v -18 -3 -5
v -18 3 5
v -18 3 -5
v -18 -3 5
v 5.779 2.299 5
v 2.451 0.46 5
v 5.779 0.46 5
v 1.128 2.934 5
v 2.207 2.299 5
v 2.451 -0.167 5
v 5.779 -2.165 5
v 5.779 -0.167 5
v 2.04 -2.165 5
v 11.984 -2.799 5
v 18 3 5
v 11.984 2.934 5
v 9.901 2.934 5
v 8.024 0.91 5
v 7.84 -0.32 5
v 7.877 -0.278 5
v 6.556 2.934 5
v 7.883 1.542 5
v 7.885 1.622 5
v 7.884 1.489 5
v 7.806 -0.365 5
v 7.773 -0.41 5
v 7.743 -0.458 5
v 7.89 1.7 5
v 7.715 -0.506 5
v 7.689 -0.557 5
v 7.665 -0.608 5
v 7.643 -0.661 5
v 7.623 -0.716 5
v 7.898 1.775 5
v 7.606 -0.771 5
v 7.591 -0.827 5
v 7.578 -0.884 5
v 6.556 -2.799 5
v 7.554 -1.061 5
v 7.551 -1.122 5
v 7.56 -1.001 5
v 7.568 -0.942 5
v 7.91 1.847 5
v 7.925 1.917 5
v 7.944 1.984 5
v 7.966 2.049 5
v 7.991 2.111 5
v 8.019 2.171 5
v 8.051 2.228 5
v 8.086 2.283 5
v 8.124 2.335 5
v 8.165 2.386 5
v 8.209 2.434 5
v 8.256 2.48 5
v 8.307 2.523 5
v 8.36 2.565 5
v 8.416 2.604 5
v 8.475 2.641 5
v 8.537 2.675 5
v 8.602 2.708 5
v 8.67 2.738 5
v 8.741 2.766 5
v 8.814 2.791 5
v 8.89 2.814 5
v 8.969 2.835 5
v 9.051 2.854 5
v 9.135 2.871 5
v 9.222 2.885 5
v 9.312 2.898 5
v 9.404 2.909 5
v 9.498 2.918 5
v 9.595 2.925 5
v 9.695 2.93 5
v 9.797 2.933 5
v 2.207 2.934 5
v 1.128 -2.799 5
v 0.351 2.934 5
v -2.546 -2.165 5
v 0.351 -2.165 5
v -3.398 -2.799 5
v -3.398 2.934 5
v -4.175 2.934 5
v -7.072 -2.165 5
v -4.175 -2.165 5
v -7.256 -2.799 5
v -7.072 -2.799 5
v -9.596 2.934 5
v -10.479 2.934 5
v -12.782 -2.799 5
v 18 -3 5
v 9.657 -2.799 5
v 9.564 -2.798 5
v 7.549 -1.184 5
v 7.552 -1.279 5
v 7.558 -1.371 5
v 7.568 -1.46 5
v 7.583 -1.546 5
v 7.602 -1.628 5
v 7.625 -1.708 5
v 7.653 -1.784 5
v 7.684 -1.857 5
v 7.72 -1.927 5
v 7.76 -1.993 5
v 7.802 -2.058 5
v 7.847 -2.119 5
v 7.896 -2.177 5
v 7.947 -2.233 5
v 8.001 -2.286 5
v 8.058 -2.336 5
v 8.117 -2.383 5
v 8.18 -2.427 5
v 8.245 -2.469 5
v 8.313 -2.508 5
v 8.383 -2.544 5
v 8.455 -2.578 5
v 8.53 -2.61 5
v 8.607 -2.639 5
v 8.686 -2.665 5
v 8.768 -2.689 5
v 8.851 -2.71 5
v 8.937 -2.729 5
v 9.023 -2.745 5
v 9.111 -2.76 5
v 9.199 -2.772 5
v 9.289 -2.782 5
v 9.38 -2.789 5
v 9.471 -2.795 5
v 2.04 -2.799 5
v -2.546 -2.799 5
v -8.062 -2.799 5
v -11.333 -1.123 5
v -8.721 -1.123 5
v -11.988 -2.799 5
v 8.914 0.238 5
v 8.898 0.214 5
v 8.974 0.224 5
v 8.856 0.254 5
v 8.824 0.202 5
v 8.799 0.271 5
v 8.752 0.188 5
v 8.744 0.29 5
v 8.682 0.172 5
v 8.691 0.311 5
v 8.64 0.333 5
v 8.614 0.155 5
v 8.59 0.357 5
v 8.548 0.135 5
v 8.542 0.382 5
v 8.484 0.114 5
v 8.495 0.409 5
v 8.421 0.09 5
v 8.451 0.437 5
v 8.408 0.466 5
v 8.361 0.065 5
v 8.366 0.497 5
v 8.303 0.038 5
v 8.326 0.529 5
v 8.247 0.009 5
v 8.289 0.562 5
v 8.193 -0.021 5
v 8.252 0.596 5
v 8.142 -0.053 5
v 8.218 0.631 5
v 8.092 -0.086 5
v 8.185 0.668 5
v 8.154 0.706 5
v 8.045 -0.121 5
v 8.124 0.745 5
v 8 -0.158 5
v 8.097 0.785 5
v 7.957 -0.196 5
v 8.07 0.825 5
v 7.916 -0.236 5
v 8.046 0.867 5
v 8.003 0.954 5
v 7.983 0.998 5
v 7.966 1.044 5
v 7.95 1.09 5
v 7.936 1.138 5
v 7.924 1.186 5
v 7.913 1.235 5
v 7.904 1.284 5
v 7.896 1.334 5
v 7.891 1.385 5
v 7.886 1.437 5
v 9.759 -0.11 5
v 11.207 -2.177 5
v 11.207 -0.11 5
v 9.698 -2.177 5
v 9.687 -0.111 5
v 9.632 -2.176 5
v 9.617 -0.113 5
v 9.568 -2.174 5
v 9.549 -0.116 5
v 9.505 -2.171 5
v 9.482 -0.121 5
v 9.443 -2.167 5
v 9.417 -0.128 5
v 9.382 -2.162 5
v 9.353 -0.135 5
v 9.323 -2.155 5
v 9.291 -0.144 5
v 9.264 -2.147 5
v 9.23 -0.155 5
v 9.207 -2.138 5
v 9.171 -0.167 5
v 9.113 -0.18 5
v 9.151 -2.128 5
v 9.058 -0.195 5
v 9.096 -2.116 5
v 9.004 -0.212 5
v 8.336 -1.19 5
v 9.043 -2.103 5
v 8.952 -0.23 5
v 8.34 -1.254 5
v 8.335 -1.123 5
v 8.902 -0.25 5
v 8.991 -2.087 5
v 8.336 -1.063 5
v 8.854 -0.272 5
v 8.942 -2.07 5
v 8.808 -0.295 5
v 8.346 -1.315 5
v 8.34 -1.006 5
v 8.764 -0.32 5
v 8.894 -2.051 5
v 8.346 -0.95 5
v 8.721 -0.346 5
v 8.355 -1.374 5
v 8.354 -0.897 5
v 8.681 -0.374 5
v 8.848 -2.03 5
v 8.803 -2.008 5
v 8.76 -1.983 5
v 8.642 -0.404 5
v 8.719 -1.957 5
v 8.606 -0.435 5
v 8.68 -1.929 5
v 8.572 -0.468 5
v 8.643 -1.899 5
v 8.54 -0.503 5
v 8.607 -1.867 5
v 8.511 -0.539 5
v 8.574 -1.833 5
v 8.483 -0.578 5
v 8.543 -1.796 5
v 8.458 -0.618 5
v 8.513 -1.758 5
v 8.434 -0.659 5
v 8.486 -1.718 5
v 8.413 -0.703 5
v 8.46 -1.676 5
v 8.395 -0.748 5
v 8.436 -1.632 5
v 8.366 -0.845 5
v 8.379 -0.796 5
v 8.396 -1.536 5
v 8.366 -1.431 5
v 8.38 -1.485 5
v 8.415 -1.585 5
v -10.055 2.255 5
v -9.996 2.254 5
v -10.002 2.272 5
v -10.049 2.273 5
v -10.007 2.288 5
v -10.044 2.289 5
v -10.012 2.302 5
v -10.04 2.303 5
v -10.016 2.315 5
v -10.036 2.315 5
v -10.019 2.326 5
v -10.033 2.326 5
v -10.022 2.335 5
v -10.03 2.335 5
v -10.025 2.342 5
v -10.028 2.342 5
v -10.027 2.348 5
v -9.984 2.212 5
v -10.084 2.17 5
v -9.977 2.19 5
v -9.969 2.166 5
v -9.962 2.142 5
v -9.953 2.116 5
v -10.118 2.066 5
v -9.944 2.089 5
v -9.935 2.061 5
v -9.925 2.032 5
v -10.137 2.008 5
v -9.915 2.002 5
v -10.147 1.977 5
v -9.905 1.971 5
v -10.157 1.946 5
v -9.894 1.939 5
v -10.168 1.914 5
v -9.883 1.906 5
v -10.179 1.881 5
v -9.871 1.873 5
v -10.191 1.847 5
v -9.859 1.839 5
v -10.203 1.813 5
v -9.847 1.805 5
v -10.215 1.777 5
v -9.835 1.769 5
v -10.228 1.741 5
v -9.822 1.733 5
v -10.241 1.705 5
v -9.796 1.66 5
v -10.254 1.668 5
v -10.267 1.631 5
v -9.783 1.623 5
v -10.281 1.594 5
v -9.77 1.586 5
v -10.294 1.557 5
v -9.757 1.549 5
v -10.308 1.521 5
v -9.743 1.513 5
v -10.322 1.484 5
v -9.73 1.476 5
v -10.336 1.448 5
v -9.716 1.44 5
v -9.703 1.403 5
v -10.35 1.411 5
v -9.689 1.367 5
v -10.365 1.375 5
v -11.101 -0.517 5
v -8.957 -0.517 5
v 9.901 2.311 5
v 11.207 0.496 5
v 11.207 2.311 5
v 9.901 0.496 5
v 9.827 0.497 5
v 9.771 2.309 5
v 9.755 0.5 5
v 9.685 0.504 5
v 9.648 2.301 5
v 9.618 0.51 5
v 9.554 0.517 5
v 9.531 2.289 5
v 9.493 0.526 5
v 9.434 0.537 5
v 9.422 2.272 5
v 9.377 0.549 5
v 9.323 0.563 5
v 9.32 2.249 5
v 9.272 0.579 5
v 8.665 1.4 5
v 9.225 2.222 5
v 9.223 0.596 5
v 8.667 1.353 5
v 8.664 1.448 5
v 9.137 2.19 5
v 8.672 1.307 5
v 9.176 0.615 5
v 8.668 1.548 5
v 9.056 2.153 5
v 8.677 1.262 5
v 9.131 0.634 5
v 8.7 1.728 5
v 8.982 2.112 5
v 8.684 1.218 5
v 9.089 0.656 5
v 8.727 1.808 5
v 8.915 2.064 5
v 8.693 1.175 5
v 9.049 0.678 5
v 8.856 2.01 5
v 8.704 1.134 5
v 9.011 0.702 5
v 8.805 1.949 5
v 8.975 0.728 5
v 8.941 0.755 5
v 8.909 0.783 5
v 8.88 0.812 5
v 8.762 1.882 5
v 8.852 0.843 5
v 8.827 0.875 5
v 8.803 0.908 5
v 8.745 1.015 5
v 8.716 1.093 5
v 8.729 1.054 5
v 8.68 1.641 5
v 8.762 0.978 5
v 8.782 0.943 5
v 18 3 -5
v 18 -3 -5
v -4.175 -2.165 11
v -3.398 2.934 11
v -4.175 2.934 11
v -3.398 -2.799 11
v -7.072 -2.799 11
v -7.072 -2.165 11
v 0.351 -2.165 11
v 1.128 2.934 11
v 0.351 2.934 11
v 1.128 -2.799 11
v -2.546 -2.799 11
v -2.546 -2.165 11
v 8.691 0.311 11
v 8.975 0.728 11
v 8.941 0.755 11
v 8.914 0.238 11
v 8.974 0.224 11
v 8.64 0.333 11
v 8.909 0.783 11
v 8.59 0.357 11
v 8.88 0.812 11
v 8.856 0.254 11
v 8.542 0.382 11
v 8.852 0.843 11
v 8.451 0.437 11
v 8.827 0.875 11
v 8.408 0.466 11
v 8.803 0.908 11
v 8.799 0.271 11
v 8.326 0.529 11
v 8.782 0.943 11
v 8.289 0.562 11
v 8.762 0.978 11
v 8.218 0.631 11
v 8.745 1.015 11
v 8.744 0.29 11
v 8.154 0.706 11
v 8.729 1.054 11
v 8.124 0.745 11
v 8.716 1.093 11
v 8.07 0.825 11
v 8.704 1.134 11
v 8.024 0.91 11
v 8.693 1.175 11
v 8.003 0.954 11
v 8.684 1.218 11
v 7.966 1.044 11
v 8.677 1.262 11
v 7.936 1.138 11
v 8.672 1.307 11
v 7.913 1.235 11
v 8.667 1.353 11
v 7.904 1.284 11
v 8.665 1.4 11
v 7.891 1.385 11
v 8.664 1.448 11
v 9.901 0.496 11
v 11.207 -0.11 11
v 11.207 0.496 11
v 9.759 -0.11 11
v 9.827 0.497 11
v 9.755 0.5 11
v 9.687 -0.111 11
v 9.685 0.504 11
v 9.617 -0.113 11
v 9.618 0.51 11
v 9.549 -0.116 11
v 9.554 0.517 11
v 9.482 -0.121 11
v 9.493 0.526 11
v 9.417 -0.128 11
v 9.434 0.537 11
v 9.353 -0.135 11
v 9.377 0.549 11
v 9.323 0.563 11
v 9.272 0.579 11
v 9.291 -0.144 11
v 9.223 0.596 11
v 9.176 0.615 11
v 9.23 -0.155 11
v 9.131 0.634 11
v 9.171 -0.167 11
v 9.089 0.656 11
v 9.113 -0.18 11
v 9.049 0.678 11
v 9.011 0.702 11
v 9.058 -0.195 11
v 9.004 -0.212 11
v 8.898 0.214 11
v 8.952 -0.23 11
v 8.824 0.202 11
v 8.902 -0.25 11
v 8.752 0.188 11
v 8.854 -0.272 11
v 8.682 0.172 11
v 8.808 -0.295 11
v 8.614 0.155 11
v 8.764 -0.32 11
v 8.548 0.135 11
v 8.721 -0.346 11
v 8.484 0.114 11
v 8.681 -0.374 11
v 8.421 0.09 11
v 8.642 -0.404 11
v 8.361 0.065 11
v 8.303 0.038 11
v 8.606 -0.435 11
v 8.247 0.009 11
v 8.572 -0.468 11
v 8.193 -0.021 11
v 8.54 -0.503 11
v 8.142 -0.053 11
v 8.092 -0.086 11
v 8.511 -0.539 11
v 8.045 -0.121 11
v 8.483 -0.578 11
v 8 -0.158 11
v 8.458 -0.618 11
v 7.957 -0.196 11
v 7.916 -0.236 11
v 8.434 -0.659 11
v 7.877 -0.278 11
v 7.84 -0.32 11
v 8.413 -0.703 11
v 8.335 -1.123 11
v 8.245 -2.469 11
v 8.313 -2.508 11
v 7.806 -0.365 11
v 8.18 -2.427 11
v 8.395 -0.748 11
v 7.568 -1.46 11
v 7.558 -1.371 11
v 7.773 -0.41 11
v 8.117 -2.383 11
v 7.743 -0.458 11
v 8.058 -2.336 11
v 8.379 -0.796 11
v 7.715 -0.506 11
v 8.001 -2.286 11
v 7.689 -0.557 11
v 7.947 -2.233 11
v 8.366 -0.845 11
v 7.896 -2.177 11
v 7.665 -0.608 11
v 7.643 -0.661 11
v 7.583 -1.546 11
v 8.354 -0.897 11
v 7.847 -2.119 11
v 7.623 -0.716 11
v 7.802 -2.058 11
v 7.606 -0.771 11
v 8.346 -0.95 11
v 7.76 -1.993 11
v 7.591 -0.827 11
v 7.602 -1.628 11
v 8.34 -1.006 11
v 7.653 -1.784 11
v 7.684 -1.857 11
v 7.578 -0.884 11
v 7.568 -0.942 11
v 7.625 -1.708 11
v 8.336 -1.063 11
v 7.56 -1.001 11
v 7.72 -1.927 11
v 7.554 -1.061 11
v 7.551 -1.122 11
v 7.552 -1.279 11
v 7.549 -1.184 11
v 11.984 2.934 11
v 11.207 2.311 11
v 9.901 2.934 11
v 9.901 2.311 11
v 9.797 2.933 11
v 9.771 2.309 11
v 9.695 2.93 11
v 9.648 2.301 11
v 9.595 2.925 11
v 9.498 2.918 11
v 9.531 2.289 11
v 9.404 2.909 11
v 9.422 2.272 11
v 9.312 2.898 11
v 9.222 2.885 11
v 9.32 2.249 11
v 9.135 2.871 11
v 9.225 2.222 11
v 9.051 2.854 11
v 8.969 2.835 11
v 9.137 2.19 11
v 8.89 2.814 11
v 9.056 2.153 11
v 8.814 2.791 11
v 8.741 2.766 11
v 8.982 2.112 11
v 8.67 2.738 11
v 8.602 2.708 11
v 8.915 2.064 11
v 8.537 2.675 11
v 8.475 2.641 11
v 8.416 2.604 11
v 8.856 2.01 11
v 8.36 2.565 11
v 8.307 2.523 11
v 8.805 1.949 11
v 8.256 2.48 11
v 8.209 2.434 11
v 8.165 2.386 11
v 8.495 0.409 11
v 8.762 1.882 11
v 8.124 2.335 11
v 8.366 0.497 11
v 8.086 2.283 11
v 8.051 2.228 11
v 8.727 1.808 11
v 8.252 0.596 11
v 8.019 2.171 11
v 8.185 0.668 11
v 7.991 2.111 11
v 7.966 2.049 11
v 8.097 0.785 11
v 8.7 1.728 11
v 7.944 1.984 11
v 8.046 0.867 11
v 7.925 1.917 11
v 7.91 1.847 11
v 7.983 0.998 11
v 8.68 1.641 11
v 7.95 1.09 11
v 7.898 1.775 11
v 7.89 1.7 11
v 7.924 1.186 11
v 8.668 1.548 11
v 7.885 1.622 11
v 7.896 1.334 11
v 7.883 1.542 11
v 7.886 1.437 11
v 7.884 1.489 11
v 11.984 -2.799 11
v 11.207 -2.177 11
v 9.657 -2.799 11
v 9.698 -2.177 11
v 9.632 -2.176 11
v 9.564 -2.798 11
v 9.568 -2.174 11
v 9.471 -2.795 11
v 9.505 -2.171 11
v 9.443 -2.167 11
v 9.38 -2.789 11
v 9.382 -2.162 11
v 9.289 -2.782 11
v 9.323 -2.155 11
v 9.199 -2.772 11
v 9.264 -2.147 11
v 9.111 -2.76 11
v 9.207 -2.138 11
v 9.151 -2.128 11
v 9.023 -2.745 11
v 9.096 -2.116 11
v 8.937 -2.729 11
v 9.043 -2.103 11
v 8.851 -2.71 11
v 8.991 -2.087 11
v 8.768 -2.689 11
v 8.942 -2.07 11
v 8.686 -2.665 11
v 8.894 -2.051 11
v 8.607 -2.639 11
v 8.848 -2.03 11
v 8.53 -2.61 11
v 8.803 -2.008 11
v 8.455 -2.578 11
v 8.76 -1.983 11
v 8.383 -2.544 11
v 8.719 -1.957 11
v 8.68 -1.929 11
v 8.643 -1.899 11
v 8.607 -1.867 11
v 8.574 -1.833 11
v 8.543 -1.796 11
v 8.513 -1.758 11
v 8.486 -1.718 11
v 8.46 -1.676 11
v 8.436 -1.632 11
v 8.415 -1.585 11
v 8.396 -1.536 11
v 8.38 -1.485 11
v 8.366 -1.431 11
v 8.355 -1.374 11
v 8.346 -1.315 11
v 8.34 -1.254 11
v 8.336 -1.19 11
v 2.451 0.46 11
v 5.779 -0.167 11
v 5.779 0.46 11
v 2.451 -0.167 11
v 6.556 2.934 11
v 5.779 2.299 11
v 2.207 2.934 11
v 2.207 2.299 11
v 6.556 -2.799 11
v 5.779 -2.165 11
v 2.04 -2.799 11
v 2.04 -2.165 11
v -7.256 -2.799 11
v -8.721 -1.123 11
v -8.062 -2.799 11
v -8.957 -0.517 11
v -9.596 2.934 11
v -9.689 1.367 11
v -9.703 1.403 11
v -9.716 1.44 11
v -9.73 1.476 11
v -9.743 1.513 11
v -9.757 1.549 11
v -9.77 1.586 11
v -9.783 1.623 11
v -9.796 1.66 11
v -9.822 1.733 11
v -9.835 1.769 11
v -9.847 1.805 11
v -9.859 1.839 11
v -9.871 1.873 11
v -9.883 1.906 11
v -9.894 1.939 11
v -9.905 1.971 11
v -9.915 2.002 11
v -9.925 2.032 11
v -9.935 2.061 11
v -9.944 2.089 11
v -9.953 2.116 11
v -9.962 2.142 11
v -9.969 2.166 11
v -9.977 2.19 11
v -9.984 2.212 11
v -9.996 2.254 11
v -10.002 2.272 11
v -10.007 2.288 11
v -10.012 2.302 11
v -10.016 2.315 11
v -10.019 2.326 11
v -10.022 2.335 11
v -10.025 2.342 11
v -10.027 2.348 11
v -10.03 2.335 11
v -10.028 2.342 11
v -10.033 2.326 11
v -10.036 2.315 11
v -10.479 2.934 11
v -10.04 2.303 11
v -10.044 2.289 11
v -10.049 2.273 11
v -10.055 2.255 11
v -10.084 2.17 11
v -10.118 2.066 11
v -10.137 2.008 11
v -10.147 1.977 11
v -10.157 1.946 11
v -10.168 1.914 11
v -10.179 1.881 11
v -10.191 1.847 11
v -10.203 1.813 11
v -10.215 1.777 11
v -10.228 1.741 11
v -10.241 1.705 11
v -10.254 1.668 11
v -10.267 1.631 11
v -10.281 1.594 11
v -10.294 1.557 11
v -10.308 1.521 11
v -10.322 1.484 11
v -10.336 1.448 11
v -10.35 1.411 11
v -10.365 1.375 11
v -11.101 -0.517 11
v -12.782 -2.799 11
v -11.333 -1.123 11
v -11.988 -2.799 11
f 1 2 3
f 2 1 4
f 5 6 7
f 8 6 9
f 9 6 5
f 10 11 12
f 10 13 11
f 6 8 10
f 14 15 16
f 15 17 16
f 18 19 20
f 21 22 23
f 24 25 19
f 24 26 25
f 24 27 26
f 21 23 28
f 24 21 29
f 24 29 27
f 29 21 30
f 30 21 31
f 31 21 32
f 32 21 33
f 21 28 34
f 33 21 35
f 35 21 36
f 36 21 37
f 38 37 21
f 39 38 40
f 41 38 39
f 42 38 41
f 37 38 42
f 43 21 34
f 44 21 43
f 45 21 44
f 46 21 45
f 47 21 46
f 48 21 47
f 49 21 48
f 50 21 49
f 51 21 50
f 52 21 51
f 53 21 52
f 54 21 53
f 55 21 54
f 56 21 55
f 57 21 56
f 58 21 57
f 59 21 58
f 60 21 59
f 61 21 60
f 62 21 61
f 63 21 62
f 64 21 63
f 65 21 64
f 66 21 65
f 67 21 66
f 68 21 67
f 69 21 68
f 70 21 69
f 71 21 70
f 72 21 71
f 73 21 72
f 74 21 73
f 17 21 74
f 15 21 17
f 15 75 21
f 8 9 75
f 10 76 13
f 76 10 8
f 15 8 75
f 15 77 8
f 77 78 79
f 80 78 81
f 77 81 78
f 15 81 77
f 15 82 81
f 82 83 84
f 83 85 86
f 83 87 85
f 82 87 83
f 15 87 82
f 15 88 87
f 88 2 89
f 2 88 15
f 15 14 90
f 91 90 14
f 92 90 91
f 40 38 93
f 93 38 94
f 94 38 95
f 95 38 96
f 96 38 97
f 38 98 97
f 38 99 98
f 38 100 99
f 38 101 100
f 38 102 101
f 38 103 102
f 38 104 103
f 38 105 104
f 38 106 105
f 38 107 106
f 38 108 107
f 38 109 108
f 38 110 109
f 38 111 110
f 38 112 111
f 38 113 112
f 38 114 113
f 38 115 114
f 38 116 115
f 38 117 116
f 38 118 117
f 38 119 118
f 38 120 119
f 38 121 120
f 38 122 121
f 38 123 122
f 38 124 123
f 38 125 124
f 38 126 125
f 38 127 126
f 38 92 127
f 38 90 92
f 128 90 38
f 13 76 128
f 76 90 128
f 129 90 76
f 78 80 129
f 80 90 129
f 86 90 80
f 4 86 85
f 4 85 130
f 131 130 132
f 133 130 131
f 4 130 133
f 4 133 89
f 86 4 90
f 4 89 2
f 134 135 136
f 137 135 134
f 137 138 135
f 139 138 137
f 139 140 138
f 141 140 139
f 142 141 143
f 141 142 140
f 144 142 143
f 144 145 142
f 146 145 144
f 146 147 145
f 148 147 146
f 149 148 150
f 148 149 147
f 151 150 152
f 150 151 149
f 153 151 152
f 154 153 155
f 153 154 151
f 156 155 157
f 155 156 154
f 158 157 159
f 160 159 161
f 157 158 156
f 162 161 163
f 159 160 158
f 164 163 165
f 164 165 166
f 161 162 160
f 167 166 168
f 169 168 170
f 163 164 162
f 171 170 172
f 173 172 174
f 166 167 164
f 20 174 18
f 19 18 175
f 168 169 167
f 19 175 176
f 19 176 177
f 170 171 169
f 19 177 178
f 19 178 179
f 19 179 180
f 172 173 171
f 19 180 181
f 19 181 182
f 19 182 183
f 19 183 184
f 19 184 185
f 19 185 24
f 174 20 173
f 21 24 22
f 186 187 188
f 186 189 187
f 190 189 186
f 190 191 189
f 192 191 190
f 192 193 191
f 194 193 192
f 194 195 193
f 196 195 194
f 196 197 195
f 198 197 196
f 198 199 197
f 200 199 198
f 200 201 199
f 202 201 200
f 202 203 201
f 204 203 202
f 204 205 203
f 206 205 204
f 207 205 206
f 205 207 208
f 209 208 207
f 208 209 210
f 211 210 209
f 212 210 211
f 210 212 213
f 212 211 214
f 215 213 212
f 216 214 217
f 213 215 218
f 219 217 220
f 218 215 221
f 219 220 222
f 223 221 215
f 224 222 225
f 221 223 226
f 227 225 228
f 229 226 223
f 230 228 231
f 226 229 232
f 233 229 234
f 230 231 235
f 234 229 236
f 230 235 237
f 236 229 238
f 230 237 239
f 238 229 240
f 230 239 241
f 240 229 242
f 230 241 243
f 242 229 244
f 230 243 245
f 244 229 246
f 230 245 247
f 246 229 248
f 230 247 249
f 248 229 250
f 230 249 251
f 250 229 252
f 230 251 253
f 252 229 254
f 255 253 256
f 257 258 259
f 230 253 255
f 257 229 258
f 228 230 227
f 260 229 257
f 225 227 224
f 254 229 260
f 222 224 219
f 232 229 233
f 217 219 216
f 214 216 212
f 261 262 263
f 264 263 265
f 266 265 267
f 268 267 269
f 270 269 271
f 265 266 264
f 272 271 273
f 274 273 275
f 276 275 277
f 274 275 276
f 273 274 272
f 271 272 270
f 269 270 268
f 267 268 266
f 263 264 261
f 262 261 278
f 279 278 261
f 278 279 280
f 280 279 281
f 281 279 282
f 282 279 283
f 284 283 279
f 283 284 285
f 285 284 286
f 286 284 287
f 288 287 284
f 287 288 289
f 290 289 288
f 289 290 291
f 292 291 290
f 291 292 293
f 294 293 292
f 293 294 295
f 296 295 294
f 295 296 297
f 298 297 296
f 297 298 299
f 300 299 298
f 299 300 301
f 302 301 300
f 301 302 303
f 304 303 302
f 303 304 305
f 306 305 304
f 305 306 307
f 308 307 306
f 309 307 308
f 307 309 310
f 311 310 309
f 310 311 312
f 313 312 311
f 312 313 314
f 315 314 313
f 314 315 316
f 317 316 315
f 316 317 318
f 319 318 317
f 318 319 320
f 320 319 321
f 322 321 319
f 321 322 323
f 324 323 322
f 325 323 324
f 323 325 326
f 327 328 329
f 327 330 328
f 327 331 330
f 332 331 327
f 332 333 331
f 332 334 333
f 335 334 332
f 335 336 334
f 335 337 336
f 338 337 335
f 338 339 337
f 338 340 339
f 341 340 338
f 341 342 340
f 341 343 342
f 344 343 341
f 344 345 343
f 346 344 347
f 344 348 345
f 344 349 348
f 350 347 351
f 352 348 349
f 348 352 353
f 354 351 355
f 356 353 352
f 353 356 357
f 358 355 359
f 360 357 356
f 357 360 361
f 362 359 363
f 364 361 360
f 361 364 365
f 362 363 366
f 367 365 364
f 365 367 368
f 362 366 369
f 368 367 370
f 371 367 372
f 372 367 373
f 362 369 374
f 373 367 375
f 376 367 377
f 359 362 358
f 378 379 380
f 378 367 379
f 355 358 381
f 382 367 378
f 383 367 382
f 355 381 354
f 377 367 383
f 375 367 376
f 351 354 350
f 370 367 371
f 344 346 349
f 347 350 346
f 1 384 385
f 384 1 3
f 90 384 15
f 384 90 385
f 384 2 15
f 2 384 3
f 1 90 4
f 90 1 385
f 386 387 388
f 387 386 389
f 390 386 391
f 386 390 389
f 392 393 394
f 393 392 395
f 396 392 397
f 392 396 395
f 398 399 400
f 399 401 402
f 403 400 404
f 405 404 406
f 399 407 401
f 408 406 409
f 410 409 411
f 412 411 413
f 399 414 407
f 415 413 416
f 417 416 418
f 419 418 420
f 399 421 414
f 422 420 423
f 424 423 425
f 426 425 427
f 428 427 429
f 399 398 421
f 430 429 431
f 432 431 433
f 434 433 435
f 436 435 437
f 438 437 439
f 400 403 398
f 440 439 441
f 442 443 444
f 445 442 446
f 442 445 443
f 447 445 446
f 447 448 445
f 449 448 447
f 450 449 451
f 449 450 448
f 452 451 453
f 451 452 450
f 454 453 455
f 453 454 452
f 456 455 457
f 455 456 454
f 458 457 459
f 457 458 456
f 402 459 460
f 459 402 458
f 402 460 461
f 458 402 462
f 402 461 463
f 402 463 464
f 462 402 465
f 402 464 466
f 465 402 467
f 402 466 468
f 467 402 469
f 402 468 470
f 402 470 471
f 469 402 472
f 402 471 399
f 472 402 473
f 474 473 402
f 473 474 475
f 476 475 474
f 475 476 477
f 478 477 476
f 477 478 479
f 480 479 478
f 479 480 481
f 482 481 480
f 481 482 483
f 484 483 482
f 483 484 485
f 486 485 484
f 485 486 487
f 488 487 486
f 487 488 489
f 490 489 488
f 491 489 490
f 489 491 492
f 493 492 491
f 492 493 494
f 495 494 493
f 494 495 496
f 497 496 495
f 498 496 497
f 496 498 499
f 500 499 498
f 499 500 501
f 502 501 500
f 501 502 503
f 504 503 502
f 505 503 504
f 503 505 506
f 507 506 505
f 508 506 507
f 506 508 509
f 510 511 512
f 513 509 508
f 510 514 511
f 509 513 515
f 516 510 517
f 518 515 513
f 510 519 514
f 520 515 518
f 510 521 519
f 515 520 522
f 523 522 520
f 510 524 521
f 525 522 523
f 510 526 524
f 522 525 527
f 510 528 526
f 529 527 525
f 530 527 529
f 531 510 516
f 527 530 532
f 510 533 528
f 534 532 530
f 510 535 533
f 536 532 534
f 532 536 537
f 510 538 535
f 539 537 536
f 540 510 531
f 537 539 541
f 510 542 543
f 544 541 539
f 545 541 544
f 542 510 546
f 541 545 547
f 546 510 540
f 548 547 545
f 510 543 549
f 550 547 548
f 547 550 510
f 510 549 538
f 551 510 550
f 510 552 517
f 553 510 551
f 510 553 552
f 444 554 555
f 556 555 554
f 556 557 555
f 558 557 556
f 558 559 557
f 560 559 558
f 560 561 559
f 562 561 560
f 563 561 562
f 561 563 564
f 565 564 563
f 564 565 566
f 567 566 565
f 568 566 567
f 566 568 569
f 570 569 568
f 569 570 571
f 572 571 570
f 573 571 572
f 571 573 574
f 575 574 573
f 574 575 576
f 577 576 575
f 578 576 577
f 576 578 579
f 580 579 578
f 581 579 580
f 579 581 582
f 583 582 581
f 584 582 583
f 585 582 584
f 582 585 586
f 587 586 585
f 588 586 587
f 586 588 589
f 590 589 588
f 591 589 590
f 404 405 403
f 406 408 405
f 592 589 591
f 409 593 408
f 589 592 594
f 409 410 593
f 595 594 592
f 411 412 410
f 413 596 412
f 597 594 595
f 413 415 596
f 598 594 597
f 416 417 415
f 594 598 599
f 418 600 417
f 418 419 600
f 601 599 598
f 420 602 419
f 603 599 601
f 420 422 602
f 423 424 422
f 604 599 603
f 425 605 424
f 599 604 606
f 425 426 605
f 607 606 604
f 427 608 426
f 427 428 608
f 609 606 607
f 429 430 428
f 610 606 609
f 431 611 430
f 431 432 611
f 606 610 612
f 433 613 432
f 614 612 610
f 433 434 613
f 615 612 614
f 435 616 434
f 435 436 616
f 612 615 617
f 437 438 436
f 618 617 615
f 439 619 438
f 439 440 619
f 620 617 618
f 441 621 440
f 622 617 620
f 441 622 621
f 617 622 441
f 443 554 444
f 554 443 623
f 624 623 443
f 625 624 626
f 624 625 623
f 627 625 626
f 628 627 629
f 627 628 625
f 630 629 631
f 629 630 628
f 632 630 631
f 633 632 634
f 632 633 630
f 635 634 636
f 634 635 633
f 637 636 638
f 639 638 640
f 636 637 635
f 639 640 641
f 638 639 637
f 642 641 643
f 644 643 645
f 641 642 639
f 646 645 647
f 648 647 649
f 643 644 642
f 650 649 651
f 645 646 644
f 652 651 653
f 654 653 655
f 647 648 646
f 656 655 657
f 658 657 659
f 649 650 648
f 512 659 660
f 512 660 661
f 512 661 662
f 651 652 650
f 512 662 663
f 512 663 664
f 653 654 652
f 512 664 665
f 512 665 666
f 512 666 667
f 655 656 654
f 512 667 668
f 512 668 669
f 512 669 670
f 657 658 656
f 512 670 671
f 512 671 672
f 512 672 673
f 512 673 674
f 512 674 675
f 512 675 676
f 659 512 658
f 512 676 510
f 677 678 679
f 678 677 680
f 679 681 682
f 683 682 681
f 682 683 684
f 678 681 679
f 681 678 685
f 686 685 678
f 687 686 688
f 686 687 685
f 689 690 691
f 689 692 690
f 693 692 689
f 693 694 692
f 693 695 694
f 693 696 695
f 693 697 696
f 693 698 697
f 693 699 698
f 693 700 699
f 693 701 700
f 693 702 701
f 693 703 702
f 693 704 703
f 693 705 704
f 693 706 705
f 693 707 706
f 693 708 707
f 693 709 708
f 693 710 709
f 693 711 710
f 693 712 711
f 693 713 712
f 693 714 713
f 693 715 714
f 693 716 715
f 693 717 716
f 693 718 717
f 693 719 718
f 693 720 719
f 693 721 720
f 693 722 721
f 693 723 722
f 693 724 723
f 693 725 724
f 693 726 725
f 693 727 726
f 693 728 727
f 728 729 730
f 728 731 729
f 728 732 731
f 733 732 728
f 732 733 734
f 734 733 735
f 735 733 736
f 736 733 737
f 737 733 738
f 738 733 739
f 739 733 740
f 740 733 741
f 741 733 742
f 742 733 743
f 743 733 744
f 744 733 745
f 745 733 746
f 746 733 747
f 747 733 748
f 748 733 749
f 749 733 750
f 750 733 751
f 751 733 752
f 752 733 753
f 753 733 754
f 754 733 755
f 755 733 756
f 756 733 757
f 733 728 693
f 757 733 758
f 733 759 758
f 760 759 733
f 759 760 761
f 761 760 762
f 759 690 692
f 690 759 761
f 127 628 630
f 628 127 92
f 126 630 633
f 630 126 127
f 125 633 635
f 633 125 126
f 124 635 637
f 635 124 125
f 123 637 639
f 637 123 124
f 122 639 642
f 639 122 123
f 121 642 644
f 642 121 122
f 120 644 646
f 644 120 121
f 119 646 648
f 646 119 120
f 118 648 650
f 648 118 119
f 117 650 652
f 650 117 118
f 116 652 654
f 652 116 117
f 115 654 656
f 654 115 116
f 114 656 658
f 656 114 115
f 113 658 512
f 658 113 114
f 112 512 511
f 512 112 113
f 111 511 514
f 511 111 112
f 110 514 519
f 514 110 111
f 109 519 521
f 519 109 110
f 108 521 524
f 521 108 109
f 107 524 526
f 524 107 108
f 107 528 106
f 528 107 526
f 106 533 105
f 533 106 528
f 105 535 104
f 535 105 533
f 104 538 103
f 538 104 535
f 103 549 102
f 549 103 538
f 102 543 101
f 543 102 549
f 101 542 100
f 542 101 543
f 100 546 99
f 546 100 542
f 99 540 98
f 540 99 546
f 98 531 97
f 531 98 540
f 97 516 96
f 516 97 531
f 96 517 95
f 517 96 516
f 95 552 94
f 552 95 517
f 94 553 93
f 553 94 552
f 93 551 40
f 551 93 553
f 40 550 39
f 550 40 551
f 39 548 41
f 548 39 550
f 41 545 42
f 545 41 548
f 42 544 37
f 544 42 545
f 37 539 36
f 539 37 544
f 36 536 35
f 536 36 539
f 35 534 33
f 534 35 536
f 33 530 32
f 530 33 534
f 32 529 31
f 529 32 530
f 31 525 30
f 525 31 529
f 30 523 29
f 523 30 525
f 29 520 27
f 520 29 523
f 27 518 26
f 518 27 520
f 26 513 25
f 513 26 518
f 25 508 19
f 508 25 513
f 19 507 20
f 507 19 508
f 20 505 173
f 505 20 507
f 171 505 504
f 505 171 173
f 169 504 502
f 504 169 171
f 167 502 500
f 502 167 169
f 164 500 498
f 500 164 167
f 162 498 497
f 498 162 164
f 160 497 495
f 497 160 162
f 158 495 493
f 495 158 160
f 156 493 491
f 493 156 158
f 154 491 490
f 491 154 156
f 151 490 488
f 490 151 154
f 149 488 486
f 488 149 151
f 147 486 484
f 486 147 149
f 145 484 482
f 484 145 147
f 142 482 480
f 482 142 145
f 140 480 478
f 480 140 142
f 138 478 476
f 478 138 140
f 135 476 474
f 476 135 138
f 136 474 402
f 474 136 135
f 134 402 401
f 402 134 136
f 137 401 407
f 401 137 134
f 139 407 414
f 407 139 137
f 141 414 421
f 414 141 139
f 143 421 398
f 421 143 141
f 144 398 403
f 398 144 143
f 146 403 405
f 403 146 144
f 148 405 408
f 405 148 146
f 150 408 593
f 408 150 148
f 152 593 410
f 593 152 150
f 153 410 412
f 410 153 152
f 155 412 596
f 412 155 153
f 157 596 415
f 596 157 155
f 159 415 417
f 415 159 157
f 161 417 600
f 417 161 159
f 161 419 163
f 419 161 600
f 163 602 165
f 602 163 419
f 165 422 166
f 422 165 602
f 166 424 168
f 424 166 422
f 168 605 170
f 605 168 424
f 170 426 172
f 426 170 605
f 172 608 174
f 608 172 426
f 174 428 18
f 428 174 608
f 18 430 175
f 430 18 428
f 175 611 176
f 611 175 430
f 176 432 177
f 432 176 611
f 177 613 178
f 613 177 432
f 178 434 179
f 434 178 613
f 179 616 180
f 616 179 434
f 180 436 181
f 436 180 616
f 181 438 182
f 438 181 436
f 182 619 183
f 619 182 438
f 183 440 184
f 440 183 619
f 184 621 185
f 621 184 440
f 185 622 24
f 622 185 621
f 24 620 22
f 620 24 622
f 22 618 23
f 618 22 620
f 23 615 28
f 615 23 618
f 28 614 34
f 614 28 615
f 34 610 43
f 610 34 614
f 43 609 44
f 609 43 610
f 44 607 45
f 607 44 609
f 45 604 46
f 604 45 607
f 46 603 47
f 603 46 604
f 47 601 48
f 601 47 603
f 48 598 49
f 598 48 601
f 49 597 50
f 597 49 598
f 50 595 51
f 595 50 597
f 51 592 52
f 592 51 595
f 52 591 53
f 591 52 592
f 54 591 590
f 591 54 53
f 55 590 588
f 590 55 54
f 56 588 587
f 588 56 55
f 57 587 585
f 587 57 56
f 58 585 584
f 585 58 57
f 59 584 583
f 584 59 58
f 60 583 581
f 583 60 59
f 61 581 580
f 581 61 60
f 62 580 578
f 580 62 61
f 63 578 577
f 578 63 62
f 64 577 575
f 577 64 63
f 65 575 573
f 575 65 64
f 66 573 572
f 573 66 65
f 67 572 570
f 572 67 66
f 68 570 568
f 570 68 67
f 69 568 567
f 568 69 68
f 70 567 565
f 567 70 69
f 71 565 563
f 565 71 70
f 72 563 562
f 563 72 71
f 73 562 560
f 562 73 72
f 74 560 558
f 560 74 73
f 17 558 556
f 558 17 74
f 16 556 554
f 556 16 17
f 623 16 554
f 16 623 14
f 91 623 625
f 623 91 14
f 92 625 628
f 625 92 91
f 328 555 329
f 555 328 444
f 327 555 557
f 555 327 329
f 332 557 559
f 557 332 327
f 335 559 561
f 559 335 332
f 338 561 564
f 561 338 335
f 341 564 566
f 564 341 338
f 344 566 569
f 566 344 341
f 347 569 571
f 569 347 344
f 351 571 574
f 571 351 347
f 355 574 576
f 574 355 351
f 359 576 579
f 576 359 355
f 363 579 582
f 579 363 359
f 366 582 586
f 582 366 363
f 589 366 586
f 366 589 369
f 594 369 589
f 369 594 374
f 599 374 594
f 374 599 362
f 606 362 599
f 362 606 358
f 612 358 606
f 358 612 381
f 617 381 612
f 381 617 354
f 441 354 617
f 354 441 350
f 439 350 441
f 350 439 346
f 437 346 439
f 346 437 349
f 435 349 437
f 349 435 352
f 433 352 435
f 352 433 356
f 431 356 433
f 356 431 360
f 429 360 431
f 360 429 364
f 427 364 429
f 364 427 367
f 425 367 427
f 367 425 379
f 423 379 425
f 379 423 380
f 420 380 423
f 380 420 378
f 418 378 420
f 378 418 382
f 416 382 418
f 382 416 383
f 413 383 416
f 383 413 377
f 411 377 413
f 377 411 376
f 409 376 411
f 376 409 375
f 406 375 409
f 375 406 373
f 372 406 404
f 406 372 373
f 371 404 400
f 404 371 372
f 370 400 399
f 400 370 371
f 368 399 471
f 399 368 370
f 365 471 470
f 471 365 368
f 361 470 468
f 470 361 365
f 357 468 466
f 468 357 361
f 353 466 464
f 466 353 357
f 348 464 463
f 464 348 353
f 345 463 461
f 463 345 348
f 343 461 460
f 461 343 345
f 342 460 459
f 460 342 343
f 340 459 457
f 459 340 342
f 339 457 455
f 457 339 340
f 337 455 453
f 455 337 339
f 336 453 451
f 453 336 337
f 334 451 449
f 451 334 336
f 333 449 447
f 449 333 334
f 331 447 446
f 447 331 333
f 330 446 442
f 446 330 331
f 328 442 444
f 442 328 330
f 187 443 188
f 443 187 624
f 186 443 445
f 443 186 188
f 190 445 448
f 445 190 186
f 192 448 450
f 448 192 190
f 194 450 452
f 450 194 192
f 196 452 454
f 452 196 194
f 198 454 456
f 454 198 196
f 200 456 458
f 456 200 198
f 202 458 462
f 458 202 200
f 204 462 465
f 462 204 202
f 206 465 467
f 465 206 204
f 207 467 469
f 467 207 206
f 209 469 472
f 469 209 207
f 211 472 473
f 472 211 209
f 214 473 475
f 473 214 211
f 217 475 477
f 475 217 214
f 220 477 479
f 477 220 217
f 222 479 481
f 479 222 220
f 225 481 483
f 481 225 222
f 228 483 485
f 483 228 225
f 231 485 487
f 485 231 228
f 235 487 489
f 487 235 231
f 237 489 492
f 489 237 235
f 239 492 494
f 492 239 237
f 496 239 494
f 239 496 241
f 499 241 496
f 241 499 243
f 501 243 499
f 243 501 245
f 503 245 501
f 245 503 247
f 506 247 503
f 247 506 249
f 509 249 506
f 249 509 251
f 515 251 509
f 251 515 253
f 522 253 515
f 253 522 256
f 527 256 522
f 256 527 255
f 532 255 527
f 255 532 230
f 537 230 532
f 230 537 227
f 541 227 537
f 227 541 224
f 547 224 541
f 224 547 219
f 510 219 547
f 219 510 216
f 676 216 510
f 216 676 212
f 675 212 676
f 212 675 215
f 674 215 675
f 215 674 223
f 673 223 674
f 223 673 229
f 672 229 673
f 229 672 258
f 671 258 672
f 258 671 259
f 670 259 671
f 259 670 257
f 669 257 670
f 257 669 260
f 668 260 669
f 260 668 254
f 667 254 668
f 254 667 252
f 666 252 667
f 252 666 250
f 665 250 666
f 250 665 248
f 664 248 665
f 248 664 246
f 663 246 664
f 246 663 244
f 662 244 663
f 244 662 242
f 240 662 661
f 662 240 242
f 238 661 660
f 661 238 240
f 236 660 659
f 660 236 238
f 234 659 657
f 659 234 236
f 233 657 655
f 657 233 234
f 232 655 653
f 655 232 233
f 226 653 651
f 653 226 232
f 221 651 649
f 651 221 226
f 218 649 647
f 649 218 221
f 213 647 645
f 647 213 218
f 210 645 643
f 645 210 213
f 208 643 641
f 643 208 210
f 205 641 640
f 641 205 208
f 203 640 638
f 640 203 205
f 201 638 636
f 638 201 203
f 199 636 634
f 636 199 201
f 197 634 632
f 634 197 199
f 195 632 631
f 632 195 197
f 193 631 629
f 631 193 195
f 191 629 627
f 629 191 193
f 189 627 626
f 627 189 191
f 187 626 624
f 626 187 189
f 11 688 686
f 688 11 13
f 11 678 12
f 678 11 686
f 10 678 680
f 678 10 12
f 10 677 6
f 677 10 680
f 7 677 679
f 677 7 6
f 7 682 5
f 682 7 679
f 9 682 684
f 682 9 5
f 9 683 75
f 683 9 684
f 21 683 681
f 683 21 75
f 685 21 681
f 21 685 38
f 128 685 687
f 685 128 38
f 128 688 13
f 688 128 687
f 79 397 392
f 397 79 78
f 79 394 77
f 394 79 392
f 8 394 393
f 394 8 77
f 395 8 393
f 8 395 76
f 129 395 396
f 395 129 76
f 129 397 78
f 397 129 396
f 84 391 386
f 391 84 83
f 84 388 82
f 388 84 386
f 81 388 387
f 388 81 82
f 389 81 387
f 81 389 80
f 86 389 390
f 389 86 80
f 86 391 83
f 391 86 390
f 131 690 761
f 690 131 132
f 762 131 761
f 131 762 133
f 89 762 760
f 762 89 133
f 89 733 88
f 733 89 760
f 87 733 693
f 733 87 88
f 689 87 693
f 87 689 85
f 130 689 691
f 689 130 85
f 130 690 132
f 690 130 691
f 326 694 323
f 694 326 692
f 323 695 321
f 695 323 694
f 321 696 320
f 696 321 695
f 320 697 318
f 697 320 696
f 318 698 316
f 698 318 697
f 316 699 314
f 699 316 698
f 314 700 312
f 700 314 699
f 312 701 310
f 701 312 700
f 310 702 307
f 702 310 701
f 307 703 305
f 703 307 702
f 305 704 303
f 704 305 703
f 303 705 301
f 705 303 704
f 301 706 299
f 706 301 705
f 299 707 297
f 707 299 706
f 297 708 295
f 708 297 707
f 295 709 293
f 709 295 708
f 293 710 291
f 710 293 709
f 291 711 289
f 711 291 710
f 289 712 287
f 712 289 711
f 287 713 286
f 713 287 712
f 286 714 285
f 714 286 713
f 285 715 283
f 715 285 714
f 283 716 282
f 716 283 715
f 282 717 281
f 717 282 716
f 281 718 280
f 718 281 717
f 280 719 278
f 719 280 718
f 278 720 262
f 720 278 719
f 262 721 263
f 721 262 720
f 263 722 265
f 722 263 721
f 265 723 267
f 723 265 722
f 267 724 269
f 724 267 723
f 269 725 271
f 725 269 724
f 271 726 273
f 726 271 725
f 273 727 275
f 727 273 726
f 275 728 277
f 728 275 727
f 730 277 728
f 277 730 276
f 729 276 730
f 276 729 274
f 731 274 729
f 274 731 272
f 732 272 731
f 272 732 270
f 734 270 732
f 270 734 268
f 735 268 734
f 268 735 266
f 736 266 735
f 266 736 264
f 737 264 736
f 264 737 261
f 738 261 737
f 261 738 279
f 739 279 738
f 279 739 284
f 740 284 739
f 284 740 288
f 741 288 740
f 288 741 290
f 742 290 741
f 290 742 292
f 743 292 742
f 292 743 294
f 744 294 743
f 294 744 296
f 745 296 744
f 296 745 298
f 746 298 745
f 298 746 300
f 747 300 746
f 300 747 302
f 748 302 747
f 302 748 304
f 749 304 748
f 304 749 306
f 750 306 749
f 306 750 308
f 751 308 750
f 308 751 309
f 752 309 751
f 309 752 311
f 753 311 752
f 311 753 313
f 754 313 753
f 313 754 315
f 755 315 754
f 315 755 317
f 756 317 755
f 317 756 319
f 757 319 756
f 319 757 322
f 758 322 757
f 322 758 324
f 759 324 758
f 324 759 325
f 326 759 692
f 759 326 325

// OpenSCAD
// ===== 参数设置 =====
name          = "BELLA";   // 默认印章文字（会被命令行覆盖）
base_len      = 36;        // 底座长度，会被 -D base_len=xx 覆盖
base_width    = 6;         // 底座宽度 (Y)
base_height   = 10;        // 底座高度 (Z)

letter_size   = 6;         // 字体高度 (size)
letter_height = 6;         // 文字挤出高度
font_name     = "Arial";   // 字体

$fn = 64;                  // 圆弧精细度（可选）

// ===== 主体模块 =====
module stamp_body() {
    union() {
        // 底座：居中放置
        cube([base_len, base_width, base_height], center = true);

        // 文字：放在底座顶面，向上拉伸
        translate([0, 0, base_height/2])
            linear_extrude(height = letter_height)
                text(name,
                     size   = letter_size,
                     font   = font_name,
                     halign = "center",
                     valign = "center");
    }
}

// ===== 镜像整个印章（压印后文字为正） =====
mirror([1, 0, 0])   // 沿 YZ 平面左右翻转
    stamp_body();
